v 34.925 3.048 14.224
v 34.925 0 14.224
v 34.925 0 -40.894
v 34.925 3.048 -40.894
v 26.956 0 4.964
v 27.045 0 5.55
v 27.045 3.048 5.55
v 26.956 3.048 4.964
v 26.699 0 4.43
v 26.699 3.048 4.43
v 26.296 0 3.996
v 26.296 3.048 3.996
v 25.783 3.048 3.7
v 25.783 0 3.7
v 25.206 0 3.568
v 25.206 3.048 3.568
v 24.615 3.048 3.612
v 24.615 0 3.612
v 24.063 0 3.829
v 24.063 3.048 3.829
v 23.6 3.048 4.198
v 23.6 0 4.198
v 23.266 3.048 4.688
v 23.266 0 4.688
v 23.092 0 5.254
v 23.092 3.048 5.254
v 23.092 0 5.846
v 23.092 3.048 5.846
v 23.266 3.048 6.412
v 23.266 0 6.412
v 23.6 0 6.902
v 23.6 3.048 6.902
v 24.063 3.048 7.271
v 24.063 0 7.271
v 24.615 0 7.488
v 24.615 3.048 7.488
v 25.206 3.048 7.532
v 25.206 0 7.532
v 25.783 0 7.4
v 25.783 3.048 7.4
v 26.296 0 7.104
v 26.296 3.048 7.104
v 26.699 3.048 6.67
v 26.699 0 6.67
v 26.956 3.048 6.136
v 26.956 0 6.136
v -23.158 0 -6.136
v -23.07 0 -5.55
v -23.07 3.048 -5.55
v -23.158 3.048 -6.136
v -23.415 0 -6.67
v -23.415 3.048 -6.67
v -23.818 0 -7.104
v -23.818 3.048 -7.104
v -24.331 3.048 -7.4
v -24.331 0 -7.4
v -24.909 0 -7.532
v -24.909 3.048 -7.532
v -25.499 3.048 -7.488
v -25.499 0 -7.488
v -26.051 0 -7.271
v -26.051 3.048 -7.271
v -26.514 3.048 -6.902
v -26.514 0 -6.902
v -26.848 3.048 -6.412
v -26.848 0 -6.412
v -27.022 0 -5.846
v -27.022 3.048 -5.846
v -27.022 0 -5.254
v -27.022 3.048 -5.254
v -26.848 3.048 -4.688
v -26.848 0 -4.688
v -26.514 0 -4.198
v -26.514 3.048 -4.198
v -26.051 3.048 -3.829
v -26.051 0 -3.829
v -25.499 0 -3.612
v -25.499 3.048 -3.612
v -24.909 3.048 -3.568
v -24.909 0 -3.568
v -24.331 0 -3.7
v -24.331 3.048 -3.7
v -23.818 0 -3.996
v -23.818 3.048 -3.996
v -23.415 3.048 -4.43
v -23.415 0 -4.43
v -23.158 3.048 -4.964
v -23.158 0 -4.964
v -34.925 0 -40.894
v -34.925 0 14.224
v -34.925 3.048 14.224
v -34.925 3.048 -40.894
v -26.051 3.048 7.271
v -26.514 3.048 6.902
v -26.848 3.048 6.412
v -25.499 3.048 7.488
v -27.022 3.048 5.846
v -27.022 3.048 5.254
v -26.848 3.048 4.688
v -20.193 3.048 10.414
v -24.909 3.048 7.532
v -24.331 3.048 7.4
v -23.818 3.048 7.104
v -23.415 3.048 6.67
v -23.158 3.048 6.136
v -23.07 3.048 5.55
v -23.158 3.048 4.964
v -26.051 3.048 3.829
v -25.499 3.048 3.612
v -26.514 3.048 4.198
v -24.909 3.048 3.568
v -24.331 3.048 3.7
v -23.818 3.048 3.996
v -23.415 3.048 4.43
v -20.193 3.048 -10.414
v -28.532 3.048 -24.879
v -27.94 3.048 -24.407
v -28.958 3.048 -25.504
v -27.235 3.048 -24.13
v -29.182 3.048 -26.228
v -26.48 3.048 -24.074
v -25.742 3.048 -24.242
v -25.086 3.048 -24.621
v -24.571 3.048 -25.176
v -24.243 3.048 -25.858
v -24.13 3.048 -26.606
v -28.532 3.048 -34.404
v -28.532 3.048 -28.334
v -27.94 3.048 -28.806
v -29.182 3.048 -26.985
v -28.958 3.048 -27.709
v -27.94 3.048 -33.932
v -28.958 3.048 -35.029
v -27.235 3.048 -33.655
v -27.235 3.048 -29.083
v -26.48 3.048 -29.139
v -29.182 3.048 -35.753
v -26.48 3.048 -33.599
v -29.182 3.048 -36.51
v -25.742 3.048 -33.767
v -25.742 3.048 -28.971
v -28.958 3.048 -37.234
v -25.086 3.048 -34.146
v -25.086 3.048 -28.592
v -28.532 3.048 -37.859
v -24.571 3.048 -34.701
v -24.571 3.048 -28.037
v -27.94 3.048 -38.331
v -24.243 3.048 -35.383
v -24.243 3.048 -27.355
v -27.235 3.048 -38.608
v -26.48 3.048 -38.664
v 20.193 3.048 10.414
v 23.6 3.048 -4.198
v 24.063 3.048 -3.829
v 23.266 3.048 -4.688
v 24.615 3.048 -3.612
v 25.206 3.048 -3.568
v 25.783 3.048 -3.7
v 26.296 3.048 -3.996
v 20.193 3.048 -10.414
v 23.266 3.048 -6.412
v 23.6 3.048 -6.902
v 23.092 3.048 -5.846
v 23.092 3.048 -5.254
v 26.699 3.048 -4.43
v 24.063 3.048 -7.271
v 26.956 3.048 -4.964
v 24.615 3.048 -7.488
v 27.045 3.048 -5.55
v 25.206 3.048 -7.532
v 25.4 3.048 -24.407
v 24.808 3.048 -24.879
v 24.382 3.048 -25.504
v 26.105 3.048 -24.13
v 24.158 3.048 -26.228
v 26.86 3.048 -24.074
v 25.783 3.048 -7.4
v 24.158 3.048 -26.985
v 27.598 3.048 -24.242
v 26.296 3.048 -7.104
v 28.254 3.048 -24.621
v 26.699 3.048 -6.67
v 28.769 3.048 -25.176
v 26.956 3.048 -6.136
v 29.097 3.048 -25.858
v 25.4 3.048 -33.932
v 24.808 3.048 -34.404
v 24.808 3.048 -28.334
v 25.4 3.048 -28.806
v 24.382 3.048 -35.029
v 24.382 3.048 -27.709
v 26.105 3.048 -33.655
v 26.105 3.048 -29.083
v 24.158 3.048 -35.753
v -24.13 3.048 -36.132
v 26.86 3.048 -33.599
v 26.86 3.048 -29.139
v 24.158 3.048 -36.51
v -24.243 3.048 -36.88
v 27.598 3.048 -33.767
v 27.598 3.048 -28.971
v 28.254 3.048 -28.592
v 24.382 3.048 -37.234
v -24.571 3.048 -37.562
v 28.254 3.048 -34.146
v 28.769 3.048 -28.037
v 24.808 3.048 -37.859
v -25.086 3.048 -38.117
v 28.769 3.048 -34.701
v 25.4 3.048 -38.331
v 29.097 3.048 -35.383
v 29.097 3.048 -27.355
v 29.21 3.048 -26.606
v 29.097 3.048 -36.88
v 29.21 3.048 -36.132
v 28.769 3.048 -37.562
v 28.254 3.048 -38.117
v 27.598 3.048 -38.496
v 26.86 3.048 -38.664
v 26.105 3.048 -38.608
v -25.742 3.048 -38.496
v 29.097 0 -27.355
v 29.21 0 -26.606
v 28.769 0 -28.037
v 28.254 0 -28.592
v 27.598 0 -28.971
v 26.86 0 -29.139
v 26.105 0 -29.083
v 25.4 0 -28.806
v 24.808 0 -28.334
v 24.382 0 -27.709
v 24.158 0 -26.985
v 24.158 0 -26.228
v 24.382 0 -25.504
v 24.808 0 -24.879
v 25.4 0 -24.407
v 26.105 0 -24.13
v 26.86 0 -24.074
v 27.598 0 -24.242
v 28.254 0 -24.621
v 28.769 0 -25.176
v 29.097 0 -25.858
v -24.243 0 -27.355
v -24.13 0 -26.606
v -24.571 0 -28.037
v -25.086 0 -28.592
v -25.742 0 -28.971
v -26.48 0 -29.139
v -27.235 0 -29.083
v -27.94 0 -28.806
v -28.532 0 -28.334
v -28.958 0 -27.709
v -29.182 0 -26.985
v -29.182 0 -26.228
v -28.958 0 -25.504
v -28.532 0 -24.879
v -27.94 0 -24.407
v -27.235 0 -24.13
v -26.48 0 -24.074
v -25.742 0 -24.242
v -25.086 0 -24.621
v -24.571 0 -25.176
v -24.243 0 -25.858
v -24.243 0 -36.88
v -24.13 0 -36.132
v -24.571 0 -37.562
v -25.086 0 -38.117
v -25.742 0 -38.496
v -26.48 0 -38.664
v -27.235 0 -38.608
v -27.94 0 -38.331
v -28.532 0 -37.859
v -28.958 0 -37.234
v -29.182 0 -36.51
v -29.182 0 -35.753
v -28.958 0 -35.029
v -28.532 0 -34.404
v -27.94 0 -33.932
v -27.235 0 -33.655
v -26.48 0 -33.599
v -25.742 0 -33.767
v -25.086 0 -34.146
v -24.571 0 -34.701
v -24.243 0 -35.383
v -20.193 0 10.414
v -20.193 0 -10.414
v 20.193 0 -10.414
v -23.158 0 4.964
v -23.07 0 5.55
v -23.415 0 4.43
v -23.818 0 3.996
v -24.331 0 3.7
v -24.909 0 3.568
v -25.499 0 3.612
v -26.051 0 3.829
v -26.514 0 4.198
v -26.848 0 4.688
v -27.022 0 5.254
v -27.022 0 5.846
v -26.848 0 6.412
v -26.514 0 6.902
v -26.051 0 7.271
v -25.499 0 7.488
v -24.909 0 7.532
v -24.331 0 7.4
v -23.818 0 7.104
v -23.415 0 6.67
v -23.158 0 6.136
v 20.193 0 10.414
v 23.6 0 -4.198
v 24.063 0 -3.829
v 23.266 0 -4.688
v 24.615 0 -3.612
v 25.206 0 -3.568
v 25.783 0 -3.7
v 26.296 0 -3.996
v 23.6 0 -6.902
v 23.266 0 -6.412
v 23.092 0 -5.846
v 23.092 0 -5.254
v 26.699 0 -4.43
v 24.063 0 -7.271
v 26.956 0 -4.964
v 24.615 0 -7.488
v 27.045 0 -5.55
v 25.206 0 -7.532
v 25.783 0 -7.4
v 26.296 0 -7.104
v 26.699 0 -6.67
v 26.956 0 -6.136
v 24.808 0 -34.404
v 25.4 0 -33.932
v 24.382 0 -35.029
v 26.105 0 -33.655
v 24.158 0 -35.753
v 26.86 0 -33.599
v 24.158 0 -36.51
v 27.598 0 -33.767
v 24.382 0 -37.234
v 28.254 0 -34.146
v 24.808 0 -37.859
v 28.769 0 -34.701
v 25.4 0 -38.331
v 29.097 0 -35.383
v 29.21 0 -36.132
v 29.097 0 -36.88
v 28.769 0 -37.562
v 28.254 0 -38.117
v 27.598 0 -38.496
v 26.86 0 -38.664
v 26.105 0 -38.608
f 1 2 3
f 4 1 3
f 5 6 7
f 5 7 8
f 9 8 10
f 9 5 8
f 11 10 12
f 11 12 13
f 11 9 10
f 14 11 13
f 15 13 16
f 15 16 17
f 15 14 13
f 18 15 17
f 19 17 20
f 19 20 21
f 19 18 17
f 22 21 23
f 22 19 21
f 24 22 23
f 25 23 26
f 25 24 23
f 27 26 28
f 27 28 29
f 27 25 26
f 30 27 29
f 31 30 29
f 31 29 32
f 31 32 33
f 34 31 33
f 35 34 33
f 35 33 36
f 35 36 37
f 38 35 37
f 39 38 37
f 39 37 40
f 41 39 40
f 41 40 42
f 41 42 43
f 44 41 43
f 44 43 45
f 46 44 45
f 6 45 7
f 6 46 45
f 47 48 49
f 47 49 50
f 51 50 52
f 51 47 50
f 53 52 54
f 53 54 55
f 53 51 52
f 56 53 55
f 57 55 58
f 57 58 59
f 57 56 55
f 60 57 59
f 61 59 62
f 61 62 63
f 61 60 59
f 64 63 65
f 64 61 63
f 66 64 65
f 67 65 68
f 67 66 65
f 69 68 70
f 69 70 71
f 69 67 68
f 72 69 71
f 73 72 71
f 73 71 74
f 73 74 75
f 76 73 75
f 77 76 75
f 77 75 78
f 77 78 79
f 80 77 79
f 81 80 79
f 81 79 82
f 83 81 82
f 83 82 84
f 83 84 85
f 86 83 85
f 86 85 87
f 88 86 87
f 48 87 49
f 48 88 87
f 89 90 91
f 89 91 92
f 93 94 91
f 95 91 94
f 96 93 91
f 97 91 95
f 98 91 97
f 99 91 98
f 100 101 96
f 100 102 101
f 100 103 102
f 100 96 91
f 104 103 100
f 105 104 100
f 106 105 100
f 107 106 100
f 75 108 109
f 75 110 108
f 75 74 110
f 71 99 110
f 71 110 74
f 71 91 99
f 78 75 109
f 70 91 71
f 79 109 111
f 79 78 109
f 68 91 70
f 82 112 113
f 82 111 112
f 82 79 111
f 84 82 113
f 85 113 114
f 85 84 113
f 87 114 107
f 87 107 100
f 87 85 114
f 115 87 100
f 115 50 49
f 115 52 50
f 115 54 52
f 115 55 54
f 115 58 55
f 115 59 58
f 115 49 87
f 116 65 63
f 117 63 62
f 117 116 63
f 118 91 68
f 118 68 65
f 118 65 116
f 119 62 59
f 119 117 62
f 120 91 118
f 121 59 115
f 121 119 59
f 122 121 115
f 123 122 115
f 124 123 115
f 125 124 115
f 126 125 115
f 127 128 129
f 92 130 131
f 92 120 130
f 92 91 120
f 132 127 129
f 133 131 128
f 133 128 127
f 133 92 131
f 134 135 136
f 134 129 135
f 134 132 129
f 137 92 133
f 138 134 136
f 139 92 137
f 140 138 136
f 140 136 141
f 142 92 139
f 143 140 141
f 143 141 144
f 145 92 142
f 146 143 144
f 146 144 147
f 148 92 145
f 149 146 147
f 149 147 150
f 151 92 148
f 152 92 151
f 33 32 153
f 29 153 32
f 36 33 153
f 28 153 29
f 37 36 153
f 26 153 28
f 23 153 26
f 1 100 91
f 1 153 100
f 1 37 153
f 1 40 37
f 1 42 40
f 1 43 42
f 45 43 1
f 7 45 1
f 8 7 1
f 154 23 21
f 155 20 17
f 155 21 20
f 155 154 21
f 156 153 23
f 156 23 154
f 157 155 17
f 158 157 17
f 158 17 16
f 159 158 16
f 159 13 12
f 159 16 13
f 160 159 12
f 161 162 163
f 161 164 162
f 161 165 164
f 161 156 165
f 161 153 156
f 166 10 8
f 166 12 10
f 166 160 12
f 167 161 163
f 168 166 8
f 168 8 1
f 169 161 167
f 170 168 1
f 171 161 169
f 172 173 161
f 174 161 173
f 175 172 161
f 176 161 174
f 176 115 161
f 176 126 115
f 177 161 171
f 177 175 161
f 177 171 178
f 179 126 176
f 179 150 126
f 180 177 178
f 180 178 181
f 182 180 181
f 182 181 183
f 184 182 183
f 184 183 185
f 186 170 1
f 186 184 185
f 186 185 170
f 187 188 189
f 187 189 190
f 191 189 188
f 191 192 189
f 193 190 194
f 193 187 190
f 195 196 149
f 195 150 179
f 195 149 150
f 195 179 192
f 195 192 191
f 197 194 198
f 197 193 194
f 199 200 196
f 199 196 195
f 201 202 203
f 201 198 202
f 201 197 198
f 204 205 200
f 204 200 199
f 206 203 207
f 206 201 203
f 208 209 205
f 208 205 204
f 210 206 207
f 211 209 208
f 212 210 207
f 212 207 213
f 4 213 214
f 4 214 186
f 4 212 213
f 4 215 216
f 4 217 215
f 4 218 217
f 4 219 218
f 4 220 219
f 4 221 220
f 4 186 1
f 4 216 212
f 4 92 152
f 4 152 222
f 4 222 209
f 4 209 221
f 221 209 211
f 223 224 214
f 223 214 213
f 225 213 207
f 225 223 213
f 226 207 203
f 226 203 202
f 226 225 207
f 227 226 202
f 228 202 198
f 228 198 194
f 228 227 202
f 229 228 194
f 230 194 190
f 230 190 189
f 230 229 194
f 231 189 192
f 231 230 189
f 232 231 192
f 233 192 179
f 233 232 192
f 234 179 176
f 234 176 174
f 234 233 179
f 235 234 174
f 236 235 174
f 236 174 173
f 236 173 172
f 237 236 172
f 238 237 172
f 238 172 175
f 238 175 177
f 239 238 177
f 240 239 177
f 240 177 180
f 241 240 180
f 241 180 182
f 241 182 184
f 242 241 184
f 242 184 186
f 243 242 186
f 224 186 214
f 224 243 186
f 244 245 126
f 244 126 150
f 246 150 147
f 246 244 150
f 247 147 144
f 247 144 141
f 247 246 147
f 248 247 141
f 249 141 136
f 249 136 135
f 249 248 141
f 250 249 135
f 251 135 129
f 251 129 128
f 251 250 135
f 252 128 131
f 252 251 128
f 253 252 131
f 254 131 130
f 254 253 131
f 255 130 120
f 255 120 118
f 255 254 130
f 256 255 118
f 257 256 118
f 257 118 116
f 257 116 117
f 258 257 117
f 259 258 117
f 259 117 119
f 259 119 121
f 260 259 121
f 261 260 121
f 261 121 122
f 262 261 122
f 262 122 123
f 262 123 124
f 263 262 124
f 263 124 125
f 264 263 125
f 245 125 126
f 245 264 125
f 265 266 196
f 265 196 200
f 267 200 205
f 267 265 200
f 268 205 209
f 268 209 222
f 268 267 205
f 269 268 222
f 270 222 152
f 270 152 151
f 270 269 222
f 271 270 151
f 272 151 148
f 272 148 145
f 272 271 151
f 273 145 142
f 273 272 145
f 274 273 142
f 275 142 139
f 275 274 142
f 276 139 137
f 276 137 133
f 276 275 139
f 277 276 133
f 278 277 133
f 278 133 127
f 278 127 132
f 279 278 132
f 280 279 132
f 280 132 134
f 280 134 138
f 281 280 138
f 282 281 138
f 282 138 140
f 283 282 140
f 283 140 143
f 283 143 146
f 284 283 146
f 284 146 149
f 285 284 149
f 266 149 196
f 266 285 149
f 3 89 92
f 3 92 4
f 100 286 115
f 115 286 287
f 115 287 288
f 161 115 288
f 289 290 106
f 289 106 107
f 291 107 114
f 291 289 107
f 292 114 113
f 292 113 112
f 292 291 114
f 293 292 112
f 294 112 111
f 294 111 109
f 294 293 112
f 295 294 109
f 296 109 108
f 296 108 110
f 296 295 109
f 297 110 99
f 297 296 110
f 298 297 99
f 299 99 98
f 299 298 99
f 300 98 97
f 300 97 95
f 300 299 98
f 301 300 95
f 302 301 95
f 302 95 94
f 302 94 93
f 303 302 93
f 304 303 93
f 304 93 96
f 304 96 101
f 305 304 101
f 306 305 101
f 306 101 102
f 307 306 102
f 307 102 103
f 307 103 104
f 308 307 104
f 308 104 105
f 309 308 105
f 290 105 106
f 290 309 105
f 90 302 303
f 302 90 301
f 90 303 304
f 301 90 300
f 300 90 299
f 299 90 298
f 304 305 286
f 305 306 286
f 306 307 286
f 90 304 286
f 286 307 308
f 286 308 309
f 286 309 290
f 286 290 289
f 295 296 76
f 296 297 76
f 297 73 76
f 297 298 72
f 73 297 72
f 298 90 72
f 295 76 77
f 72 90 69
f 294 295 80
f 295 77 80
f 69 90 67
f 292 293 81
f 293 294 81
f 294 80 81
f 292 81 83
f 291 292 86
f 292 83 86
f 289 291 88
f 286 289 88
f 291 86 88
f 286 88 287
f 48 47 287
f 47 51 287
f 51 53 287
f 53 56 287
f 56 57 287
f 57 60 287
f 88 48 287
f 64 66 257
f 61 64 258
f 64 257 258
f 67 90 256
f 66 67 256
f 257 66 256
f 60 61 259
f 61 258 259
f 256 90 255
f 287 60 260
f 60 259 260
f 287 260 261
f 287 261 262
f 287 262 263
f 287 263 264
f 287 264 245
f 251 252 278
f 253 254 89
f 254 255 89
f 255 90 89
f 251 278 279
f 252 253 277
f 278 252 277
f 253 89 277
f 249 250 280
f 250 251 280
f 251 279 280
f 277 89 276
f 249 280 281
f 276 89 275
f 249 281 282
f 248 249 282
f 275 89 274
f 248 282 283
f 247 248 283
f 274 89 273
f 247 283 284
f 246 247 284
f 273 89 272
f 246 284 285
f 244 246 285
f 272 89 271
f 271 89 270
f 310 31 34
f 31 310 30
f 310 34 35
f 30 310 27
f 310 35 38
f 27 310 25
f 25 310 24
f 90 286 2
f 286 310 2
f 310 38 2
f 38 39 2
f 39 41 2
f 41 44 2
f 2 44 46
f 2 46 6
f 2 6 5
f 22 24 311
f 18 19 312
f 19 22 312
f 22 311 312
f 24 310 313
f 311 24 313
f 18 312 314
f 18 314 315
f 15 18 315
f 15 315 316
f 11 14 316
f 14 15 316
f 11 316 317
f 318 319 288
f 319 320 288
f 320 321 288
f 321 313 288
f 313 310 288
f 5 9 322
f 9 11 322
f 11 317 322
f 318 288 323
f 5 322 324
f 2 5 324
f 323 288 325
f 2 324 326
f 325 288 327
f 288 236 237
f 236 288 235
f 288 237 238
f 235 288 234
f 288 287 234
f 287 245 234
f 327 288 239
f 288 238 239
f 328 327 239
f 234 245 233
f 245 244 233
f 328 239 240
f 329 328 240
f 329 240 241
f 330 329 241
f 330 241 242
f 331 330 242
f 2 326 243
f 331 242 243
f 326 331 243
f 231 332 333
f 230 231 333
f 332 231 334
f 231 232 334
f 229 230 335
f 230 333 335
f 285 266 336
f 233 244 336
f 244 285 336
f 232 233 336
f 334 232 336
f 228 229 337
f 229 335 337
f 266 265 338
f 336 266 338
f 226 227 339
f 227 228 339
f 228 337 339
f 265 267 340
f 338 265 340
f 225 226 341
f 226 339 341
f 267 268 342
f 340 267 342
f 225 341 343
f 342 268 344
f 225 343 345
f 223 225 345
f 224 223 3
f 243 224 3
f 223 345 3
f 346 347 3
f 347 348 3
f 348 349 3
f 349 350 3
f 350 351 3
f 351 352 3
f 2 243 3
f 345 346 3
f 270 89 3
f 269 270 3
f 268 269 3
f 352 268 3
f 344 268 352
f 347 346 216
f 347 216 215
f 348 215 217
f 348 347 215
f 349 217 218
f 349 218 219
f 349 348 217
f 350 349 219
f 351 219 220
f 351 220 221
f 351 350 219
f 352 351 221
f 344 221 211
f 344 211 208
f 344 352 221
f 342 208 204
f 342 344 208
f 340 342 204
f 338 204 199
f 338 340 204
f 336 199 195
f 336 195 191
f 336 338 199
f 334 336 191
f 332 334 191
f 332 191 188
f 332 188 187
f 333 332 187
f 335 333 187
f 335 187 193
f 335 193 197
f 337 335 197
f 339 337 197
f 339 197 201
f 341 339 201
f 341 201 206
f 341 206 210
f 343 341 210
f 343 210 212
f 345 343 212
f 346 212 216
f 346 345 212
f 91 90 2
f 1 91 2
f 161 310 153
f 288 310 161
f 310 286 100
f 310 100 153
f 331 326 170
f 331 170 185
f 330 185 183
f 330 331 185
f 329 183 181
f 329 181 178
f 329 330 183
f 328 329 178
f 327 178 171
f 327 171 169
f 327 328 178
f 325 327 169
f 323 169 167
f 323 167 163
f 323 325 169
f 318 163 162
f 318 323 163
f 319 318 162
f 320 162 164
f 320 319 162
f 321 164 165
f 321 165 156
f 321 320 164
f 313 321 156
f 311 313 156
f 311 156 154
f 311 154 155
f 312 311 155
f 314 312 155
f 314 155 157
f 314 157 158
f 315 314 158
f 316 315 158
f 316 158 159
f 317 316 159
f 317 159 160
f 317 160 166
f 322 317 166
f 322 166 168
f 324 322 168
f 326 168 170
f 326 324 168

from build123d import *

# Parameters (mm, degrees)
SKETCH1_W           = 69.85
SKETCH1_H           = 55.118
SKETCH1_R           = 1.98755
SKETCH1_R_2         = 2.54
SKETCH1_W_2         = 40.386
SKETCH1_H_2         = 20.828
BOSS_EXTRUDE1_DEPTH = 3.048


with BuildPart() as part:
    # Sketch1 → Boss-Extrude1 (new body)
    with BuildSketch(Plane(origin=(0, 0, 0), x_dir=(1, 0, 0), z_dir=(0, 1, 0))):
        with Locations((0, 13.335)):
            Rectangle(SKETCH1_W, SKETCH1_H)
        with Locations((-25.0571, -5.5499)):
            Circle(SKETCH1_R, mode=Mode.SUBTRACT)
        with Locations((-25.0571, 5.5499)):
            Circle(SKETCH1_R, mode=Mode.SUBTRACT)
        with Locations((25.0571, -5.5499)):
            Circle(SKETCH1_R, mode=Mode.SUBTRACT)
        with Locations((25.0571, 5.5499)):
            Circle(SKETCH1_R, mode=Mode.SUBTRACT)
        with Locations((-26.67, 36.1315)):
            Circle(SKETCH1_R_2, mode=Mode.SUBTRACT)
        with Locations((-26.67, 26.6065)):
            Circle(SKETCH1_R_2, mode=Mode.SUBTRACT)
        with Locations((26.67, 26.6065)):
            Circle(SKETCH1_R_2, mode=Mode.SUBTRACT)
        with Locations((26.67, 36.1315)):
            Circle(SKETCH1_R_2, mode=Mode.SUBTRACT)
        Rectangle(SKETCH1_W_2, SKETCH1_H_2, mode=Mode.SUBTRACT)
    extrude(amount=BOSS_EXTRUDE1_DEPTH)


solid = part.part
